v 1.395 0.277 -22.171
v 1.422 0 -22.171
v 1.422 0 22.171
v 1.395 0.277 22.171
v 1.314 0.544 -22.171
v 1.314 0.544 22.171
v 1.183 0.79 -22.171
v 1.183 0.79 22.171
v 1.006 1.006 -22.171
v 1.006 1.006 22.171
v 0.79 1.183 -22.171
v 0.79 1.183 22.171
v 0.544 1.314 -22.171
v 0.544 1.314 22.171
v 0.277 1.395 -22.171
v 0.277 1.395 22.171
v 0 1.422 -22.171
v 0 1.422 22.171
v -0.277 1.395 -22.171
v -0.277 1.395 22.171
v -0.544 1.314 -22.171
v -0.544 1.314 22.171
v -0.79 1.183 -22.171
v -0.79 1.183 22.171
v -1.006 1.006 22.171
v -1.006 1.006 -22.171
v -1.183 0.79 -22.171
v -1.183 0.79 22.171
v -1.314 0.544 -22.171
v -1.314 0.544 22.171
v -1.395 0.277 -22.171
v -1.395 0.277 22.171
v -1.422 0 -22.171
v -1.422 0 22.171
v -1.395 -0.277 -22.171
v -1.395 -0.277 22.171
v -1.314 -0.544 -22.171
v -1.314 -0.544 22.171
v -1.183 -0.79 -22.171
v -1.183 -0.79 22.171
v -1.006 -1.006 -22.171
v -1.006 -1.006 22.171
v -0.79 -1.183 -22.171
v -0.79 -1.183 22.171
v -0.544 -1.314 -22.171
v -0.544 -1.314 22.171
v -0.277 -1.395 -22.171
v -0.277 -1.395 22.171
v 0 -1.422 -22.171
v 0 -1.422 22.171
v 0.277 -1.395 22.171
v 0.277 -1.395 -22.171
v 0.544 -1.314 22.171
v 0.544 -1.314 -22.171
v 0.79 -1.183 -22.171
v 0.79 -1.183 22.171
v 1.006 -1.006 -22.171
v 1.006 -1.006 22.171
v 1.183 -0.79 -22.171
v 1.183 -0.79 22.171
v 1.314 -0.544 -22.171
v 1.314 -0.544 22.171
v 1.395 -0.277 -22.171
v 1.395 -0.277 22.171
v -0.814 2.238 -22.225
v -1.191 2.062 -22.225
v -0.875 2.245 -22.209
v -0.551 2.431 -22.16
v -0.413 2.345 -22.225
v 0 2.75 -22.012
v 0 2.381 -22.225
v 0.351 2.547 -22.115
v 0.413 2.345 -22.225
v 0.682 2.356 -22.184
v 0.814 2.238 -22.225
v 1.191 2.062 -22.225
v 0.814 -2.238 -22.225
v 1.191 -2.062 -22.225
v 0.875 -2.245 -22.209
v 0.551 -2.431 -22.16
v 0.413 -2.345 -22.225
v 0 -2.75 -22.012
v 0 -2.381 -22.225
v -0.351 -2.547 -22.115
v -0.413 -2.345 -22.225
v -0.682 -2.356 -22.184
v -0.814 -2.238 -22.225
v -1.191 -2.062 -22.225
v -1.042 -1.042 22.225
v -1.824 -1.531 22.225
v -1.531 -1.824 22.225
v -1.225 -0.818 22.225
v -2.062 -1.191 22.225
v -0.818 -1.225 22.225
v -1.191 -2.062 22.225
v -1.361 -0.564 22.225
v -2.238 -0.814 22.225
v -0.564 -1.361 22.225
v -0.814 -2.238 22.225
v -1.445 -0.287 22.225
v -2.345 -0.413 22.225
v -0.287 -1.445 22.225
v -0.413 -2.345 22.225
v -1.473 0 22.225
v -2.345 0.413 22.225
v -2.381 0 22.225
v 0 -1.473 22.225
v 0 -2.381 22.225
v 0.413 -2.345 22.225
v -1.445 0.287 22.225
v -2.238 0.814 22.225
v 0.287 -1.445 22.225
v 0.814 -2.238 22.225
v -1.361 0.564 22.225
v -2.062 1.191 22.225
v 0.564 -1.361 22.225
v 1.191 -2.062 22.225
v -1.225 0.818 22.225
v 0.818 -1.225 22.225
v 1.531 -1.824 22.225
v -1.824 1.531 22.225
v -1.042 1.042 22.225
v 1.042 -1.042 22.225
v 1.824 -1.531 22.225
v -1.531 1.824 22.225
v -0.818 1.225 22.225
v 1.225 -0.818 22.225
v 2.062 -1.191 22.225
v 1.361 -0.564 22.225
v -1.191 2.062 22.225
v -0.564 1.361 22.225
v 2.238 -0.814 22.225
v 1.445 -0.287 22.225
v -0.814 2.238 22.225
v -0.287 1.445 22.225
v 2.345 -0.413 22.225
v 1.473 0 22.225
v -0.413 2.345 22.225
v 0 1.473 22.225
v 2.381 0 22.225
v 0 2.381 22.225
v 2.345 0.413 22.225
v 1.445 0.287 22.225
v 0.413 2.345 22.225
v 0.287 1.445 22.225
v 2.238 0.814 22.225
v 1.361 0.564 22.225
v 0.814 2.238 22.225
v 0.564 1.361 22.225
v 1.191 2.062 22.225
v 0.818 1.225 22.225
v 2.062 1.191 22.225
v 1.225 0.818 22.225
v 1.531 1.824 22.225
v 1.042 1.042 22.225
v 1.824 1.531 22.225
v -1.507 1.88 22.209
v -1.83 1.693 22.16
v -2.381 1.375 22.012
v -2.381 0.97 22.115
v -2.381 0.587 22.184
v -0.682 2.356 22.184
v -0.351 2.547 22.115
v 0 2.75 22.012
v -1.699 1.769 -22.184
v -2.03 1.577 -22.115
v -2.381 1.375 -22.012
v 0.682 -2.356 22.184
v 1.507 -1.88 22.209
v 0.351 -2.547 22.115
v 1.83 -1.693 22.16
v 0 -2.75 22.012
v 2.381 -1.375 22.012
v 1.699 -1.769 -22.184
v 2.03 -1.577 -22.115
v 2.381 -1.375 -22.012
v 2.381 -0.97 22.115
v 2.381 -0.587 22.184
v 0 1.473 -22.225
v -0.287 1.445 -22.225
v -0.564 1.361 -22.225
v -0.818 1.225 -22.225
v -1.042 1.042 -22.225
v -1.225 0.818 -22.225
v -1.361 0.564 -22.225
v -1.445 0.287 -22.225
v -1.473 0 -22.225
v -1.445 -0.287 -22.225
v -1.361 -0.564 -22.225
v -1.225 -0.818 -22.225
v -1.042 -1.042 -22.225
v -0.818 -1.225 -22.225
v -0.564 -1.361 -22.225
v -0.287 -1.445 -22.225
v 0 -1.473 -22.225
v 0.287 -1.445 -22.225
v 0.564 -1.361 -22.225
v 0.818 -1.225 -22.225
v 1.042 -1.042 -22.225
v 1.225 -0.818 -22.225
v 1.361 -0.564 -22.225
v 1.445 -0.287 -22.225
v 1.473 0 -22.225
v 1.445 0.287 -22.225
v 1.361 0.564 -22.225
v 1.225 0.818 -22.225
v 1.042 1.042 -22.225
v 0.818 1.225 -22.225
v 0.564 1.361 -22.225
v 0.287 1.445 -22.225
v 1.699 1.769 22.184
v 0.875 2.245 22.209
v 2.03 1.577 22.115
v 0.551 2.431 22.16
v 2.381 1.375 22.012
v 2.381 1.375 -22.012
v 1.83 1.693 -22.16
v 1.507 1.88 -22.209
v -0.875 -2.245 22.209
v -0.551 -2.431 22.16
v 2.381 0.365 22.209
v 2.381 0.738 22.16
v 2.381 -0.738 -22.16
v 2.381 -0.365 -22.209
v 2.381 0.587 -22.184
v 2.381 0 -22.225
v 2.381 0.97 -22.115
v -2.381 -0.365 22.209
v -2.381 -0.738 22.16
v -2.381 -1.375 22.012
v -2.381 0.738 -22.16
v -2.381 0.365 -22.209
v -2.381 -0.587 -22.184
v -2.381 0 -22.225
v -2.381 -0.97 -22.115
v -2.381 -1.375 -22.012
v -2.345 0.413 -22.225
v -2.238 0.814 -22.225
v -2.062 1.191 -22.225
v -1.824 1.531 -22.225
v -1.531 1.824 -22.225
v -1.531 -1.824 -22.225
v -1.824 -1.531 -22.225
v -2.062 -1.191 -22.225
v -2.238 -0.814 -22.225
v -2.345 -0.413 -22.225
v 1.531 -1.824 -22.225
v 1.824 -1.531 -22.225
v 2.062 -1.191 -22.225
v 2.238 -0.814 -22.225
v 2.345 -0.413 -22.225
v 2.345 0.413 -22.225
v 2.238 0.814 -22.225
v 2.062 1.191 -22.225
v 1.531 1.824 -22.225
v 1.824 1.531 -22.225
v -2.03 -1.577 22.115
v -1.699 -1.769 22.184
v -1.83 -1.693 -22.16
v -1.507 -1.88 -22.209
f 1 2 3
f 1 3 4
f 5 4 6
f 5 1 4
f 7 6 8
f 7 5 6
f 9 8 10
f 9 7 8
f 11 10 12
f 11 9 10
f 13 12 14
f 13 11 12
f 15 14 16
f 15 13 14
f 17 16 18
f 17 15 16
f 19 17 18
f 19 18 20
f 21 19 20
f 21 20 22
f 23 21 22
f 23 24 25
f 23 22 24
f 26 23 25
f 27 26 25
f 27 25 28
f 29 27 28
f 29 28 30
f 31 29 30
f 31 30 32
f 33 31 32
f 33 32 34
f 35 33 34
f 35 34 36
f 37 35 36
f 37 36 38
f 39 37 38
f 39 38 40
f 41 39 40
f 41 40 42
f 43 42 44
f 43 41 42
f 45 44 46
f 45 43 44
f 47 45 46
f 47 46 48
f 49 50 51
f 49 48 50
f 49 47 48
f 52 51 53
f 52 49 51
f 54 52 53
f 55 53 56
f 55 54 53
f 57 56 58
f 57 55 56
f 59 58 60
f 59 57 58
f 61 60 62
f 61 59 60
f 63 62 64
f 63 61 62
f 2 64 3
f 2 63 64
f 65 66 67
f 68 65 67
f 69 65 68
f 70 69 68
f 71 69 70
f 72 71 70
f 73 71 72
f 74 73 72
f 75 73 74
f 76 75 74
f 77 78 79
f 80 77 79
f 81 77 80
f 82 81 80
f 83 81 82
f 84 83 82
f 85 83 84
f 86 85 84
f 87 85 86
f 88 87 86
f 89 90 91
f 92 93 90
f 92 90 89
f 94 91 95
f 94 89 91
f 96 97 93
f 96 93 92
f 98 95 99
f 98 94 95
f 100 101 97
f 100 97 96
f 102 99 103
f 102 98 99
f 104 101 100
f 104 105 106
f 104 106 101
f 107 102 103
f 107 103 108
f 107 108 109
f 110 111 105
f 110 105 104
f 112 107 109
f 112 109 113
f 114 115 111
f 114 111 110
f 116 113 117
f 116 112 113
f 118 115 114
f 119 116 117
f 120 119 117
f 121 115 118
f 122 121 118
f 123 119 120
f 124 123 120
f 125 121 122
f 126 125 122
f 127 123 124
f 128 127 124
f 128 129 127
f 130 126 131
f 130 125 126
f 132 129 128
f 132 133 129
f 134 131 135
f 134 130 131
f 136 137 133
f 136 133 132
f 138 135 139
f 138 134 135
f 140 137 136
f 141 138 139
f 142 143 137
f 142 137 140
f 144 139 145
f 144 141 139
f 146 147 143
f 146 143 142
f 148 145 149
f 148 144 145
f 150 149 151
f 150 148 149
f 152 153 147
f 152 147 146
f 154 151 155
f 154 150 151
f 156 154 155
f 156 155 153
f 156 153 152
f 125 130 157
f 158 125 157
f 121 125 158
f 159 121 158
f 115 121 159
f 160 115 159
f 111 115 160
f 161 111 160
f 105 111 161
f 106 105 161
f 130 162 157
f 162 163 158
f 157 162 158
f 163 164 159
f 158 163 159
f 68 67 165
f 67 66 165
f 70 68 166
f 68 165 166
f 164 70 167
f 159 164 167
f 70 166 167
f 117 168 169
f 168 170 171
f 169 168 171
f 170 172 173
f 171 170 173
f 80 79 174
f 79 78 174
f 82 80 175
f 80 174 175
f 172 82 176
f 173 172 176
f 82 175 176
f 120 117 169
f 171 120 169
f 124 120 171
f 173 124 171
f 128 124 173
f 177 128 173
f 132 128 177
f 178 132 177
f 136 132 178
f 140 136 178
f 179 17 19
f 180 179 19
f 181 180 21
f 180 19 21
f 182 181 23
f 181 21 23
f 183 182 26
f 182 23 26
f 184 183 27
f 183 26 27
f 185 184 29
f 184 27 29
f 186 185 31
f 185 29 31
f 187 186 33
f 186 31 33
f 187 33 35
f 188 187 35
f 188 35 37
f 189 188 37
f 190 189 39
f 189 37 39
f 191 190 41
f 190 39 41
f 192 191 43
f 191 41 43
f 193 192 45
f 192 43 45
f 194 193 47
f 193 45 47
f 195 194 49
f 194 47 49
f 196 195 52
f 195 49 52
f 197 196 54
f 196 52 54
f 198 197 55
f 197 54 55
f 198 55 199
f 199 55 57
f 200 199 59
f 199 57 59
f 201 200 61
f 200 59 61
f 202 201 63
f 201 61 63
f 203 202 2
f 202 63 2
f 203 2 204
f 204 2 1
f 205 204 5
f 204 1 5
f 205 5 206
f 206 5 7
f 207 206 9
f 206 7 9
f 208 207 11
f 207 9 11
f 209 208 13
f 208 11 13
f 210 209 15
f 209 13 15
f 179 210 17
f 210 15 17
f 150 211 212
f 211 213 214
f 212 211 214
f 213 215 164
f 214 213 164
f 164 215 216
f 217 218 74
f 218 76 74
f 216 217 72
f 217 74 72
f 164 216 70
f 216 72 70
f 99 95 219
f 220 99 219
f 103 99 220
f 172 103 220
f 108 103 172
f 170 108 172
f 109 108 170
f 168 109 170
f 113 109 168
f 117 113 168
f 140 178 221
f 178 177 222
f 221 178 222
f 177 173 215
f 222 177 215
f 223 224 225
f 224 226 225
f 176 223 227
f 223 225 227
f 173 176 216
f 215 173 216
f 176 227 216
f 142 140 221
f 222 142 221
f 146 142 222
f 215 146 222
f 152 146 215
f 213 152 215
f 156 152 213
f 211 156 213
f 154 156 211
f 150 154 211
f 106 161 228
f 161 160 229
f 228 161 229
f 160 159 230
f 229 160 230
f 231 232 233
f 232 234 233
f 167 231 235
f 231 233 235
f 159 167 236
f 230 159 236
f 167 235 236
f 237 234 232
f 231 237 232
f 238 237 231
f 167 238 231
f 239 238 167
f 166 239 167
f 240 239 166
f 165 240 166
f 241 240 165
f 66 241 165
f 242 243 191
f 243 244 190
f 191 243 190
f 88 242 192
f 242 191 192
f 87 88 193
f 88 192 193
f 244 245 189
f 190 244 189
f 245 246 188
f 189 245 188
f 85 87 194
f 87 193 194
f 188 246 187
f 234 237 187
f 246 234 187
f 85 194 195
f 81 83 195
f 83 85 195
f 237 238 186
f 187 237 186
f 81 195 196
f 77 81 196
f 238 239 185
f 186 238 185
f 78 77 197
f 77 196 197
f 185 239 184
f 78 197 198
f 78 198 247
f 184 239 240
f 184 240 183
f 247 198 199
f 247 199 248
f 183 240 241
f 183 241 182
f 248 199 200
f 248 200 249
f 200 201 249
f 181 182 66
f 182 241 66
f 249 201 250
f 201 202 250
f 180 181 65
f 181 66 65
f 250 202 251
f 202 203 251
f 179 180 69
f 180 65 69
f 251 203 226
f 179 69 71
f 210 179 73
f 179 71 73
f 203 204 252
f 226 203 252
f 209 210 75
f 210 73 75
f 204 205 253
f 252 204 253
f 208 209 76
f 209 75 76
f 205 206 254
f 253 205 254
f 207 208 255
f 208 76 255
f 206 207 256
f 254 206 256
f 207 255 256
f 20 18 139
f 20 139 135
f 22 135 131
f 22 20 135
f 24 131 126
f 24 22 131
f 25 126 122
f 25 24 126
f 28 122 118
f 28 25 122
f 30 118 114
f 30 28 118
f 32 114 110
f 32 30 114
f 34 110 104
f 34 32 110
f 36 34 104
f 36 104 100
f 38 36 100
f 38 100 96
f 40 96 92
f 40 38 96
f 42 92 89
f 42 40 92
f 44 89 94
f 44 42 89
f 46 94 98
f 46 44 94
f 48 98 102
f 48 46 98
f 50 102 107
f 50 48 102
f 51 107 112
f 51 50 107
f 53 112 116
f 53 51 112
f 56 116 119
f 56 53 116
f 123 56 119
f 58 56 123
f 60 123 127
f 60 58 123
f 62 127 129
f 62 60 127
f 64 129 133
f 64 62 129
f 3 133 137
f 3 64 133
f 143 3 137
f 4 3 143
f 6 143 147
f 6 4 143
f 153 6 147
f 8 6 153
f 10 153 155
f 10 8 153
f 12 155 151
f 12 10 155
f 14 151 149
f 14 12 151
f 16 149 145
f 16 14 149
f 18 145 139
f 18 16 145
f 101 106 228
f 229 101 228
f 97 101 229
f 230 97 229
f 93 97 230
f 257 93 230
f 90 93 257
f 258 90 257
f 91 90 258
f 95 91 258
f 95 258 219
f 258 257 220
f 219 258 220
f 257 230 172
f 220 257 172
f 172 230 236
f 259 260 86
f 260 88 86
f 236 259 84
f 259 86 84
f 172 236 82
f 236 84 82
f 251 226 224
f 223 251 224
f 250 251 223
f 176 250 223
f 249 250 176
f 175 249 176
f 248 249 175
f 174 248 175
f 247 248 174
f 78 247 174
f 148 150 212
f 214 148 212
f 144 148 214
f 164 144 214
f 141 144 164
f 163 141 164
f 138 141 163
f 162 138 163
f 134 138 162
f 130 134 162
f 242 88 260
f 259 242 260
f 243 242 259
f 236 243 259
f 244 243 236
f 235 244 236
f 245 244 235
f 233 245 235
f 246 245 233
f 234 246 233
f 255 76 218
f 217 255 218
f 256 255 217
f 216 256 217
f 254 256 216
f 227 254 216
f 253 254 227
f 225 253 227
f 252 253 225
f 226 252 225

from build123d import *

# Parameters (mm, degrees)
EXTRUDE1_DEPTH          = 22.225
EXTRUDE1_DEPTH_BACK     = 22.225
SKETCH1_R               = 1.4224
SKETCH8_OUTSIDE_W       = 173.728
SKETCH8_OUTSIDE_H       = 174.466
SKETCH8_OUTSIDE_R       = 2.38125
EXTRUDE4_DEPTH          = 45.598579802
EXTRUDE4_DRAFT          = -60
MIRROR1_COPY_1_SKETCH_W = 173.728
MIRROR1_COPY_1_SKETCH_H = 174.466
MIRROR1_COPY_1_SKETCH_R = 2.38125
MIRROR1_COPY_1_DEPTH    = 45.598579802
MIRROR1_COPY_1_DRAFT    = -60


with BuildPart() as part:
    # Sketch1 → Extrude1 (new, two sides: drawn at the far end of the back side and taken through both)
    with BuildSketch(Plane.XY.offset(-EXTRUDE1_DEPTH_BACK)):
        Polygon((0, 2.749630657), (-2.38125, 1.374815329), (-2.38125, -1.374815329), (0, -2.749630657), (2.38125, -1.374815329), (2.38125, 1.374815329), align=None)
        Circle(SKETCH1_R, mode=Mode.SUBTRACT)
    extrude(amount=EXTRUDE1_DEPTH + EXTRUDE1_DEPTH_BACK)

    # Extrude3 cone 1 section (through the dimple's axis) → Extrude3 (revolve, cut)
    with BuildSketch(Plane(origin=(0, 0, -22.225), x_dir=(0, 1, 0), z_dir=(1, 0, 0))):
        Polygon((0, 0), (1.4732, 0), (0, 1.579813584), align=None)
    extrude3 = revolve(axis=Axis((0, 0, -22.225), (0, 0, 1)), mode=Mode.SUBTRACT)


with BuildPart() as extrude4_tool:
    # Sketch8 outside → Extrude4 (with draft: the straight prism first)
    with BuildSketch(Plane(origin=(0, 0, -22.225), x_dir=(-1, 0, 0), z_dir=(0, 0, -1))):
        Rectangle(SKETCH8_OUTSIDE_W, SKETCH8_OUTSIDE_H)
        Circle(SKETCH8_OUTSIDE_R, mode=Mode.SUBTRACT)
    extrude(amount=-EXTRUDE4_DEPTH)
    # Extrude4: the draft: its side faces are tilted about the plane it starts from
    extrude4_sides = [extrude4_tool.faces().sort_by_distance(p)[0] for p in [
        (0, -87.233, 0.574289901),
        (-86.864, 0, 0.574289901),
        (0, 87.233, 0.574289901),
        (86.864, 0, 0.574289901),
        (2.38125, 0, 0.574289901),
    ]]
    draft(extrude4_sides, Plane(origin=(0, 0, -22.225), x_dir=(-1, 0, 0), z_dir=(0, 0, -1)), EXTRUDE4_DRAFT)


with BuildPart() as part_1:
    add(part.part)

    # Extrude4: cut by extrude4_tool
    add(extrude4_tool.part, mode=Mode.SUBTRACT)

    # Mirror1: Extrude3 across plane
    add(extrude3.mirror(Plane.XY), mode=Mode.SUBTRACT)


with BuildPart() as mirror1_copy_1_tool:
    # Mirror1 copy 1 sketch → Mirror1 copy 1 (with draft: the straight prism first)
    with BuildSketch(Plane(origin=(0, 0, 22.225), x_dir=(-1, 0, 0), z_dir=(0, 0, 1))):
        Rectangle(MIRROR1_COPY_1_SKETCH_W, MIRROR1_COPY_1_SKETCH_H)
        Circle(MIRROR1_COPY_1_SKETCH_R, mode=Mode.SUBTRACT)
    extrude(amount=-MIRROR1_COPY_1_DEPTH)
    # Mirror1 copy 1: the draft: its side faces are tilted about the plane it starts from
    mirror1_copy_1_sides = [mirror1_copy_1_tool.faces().sort_by_distance(p)[0] for p in [
        (0, -87.233, -0.574289901),
        (-86.864, 0, -0.574289901),
        (0, 87.233, -0.574289901),
        (86.864, 0, -0.574289901),
        (2.38125, 0, -0.574289901),
    ]]
    draft(mirror1_copy_1_sides, Plane(origin=(0, 0, 22.225), x_dir=(-1, 0, 0), z_dir=(0, 0, 1)), MIRROR1_COPY_1_DRAFT)


with BuildPart() as part_2:
    add(part_1.part)

    # Mirror1 copy 1: cut by mirror1_copy_1_tool
    add(mirror1_copy_1_tool.part, mode=Mode.SUBTRACT)


solid = part_2.part
